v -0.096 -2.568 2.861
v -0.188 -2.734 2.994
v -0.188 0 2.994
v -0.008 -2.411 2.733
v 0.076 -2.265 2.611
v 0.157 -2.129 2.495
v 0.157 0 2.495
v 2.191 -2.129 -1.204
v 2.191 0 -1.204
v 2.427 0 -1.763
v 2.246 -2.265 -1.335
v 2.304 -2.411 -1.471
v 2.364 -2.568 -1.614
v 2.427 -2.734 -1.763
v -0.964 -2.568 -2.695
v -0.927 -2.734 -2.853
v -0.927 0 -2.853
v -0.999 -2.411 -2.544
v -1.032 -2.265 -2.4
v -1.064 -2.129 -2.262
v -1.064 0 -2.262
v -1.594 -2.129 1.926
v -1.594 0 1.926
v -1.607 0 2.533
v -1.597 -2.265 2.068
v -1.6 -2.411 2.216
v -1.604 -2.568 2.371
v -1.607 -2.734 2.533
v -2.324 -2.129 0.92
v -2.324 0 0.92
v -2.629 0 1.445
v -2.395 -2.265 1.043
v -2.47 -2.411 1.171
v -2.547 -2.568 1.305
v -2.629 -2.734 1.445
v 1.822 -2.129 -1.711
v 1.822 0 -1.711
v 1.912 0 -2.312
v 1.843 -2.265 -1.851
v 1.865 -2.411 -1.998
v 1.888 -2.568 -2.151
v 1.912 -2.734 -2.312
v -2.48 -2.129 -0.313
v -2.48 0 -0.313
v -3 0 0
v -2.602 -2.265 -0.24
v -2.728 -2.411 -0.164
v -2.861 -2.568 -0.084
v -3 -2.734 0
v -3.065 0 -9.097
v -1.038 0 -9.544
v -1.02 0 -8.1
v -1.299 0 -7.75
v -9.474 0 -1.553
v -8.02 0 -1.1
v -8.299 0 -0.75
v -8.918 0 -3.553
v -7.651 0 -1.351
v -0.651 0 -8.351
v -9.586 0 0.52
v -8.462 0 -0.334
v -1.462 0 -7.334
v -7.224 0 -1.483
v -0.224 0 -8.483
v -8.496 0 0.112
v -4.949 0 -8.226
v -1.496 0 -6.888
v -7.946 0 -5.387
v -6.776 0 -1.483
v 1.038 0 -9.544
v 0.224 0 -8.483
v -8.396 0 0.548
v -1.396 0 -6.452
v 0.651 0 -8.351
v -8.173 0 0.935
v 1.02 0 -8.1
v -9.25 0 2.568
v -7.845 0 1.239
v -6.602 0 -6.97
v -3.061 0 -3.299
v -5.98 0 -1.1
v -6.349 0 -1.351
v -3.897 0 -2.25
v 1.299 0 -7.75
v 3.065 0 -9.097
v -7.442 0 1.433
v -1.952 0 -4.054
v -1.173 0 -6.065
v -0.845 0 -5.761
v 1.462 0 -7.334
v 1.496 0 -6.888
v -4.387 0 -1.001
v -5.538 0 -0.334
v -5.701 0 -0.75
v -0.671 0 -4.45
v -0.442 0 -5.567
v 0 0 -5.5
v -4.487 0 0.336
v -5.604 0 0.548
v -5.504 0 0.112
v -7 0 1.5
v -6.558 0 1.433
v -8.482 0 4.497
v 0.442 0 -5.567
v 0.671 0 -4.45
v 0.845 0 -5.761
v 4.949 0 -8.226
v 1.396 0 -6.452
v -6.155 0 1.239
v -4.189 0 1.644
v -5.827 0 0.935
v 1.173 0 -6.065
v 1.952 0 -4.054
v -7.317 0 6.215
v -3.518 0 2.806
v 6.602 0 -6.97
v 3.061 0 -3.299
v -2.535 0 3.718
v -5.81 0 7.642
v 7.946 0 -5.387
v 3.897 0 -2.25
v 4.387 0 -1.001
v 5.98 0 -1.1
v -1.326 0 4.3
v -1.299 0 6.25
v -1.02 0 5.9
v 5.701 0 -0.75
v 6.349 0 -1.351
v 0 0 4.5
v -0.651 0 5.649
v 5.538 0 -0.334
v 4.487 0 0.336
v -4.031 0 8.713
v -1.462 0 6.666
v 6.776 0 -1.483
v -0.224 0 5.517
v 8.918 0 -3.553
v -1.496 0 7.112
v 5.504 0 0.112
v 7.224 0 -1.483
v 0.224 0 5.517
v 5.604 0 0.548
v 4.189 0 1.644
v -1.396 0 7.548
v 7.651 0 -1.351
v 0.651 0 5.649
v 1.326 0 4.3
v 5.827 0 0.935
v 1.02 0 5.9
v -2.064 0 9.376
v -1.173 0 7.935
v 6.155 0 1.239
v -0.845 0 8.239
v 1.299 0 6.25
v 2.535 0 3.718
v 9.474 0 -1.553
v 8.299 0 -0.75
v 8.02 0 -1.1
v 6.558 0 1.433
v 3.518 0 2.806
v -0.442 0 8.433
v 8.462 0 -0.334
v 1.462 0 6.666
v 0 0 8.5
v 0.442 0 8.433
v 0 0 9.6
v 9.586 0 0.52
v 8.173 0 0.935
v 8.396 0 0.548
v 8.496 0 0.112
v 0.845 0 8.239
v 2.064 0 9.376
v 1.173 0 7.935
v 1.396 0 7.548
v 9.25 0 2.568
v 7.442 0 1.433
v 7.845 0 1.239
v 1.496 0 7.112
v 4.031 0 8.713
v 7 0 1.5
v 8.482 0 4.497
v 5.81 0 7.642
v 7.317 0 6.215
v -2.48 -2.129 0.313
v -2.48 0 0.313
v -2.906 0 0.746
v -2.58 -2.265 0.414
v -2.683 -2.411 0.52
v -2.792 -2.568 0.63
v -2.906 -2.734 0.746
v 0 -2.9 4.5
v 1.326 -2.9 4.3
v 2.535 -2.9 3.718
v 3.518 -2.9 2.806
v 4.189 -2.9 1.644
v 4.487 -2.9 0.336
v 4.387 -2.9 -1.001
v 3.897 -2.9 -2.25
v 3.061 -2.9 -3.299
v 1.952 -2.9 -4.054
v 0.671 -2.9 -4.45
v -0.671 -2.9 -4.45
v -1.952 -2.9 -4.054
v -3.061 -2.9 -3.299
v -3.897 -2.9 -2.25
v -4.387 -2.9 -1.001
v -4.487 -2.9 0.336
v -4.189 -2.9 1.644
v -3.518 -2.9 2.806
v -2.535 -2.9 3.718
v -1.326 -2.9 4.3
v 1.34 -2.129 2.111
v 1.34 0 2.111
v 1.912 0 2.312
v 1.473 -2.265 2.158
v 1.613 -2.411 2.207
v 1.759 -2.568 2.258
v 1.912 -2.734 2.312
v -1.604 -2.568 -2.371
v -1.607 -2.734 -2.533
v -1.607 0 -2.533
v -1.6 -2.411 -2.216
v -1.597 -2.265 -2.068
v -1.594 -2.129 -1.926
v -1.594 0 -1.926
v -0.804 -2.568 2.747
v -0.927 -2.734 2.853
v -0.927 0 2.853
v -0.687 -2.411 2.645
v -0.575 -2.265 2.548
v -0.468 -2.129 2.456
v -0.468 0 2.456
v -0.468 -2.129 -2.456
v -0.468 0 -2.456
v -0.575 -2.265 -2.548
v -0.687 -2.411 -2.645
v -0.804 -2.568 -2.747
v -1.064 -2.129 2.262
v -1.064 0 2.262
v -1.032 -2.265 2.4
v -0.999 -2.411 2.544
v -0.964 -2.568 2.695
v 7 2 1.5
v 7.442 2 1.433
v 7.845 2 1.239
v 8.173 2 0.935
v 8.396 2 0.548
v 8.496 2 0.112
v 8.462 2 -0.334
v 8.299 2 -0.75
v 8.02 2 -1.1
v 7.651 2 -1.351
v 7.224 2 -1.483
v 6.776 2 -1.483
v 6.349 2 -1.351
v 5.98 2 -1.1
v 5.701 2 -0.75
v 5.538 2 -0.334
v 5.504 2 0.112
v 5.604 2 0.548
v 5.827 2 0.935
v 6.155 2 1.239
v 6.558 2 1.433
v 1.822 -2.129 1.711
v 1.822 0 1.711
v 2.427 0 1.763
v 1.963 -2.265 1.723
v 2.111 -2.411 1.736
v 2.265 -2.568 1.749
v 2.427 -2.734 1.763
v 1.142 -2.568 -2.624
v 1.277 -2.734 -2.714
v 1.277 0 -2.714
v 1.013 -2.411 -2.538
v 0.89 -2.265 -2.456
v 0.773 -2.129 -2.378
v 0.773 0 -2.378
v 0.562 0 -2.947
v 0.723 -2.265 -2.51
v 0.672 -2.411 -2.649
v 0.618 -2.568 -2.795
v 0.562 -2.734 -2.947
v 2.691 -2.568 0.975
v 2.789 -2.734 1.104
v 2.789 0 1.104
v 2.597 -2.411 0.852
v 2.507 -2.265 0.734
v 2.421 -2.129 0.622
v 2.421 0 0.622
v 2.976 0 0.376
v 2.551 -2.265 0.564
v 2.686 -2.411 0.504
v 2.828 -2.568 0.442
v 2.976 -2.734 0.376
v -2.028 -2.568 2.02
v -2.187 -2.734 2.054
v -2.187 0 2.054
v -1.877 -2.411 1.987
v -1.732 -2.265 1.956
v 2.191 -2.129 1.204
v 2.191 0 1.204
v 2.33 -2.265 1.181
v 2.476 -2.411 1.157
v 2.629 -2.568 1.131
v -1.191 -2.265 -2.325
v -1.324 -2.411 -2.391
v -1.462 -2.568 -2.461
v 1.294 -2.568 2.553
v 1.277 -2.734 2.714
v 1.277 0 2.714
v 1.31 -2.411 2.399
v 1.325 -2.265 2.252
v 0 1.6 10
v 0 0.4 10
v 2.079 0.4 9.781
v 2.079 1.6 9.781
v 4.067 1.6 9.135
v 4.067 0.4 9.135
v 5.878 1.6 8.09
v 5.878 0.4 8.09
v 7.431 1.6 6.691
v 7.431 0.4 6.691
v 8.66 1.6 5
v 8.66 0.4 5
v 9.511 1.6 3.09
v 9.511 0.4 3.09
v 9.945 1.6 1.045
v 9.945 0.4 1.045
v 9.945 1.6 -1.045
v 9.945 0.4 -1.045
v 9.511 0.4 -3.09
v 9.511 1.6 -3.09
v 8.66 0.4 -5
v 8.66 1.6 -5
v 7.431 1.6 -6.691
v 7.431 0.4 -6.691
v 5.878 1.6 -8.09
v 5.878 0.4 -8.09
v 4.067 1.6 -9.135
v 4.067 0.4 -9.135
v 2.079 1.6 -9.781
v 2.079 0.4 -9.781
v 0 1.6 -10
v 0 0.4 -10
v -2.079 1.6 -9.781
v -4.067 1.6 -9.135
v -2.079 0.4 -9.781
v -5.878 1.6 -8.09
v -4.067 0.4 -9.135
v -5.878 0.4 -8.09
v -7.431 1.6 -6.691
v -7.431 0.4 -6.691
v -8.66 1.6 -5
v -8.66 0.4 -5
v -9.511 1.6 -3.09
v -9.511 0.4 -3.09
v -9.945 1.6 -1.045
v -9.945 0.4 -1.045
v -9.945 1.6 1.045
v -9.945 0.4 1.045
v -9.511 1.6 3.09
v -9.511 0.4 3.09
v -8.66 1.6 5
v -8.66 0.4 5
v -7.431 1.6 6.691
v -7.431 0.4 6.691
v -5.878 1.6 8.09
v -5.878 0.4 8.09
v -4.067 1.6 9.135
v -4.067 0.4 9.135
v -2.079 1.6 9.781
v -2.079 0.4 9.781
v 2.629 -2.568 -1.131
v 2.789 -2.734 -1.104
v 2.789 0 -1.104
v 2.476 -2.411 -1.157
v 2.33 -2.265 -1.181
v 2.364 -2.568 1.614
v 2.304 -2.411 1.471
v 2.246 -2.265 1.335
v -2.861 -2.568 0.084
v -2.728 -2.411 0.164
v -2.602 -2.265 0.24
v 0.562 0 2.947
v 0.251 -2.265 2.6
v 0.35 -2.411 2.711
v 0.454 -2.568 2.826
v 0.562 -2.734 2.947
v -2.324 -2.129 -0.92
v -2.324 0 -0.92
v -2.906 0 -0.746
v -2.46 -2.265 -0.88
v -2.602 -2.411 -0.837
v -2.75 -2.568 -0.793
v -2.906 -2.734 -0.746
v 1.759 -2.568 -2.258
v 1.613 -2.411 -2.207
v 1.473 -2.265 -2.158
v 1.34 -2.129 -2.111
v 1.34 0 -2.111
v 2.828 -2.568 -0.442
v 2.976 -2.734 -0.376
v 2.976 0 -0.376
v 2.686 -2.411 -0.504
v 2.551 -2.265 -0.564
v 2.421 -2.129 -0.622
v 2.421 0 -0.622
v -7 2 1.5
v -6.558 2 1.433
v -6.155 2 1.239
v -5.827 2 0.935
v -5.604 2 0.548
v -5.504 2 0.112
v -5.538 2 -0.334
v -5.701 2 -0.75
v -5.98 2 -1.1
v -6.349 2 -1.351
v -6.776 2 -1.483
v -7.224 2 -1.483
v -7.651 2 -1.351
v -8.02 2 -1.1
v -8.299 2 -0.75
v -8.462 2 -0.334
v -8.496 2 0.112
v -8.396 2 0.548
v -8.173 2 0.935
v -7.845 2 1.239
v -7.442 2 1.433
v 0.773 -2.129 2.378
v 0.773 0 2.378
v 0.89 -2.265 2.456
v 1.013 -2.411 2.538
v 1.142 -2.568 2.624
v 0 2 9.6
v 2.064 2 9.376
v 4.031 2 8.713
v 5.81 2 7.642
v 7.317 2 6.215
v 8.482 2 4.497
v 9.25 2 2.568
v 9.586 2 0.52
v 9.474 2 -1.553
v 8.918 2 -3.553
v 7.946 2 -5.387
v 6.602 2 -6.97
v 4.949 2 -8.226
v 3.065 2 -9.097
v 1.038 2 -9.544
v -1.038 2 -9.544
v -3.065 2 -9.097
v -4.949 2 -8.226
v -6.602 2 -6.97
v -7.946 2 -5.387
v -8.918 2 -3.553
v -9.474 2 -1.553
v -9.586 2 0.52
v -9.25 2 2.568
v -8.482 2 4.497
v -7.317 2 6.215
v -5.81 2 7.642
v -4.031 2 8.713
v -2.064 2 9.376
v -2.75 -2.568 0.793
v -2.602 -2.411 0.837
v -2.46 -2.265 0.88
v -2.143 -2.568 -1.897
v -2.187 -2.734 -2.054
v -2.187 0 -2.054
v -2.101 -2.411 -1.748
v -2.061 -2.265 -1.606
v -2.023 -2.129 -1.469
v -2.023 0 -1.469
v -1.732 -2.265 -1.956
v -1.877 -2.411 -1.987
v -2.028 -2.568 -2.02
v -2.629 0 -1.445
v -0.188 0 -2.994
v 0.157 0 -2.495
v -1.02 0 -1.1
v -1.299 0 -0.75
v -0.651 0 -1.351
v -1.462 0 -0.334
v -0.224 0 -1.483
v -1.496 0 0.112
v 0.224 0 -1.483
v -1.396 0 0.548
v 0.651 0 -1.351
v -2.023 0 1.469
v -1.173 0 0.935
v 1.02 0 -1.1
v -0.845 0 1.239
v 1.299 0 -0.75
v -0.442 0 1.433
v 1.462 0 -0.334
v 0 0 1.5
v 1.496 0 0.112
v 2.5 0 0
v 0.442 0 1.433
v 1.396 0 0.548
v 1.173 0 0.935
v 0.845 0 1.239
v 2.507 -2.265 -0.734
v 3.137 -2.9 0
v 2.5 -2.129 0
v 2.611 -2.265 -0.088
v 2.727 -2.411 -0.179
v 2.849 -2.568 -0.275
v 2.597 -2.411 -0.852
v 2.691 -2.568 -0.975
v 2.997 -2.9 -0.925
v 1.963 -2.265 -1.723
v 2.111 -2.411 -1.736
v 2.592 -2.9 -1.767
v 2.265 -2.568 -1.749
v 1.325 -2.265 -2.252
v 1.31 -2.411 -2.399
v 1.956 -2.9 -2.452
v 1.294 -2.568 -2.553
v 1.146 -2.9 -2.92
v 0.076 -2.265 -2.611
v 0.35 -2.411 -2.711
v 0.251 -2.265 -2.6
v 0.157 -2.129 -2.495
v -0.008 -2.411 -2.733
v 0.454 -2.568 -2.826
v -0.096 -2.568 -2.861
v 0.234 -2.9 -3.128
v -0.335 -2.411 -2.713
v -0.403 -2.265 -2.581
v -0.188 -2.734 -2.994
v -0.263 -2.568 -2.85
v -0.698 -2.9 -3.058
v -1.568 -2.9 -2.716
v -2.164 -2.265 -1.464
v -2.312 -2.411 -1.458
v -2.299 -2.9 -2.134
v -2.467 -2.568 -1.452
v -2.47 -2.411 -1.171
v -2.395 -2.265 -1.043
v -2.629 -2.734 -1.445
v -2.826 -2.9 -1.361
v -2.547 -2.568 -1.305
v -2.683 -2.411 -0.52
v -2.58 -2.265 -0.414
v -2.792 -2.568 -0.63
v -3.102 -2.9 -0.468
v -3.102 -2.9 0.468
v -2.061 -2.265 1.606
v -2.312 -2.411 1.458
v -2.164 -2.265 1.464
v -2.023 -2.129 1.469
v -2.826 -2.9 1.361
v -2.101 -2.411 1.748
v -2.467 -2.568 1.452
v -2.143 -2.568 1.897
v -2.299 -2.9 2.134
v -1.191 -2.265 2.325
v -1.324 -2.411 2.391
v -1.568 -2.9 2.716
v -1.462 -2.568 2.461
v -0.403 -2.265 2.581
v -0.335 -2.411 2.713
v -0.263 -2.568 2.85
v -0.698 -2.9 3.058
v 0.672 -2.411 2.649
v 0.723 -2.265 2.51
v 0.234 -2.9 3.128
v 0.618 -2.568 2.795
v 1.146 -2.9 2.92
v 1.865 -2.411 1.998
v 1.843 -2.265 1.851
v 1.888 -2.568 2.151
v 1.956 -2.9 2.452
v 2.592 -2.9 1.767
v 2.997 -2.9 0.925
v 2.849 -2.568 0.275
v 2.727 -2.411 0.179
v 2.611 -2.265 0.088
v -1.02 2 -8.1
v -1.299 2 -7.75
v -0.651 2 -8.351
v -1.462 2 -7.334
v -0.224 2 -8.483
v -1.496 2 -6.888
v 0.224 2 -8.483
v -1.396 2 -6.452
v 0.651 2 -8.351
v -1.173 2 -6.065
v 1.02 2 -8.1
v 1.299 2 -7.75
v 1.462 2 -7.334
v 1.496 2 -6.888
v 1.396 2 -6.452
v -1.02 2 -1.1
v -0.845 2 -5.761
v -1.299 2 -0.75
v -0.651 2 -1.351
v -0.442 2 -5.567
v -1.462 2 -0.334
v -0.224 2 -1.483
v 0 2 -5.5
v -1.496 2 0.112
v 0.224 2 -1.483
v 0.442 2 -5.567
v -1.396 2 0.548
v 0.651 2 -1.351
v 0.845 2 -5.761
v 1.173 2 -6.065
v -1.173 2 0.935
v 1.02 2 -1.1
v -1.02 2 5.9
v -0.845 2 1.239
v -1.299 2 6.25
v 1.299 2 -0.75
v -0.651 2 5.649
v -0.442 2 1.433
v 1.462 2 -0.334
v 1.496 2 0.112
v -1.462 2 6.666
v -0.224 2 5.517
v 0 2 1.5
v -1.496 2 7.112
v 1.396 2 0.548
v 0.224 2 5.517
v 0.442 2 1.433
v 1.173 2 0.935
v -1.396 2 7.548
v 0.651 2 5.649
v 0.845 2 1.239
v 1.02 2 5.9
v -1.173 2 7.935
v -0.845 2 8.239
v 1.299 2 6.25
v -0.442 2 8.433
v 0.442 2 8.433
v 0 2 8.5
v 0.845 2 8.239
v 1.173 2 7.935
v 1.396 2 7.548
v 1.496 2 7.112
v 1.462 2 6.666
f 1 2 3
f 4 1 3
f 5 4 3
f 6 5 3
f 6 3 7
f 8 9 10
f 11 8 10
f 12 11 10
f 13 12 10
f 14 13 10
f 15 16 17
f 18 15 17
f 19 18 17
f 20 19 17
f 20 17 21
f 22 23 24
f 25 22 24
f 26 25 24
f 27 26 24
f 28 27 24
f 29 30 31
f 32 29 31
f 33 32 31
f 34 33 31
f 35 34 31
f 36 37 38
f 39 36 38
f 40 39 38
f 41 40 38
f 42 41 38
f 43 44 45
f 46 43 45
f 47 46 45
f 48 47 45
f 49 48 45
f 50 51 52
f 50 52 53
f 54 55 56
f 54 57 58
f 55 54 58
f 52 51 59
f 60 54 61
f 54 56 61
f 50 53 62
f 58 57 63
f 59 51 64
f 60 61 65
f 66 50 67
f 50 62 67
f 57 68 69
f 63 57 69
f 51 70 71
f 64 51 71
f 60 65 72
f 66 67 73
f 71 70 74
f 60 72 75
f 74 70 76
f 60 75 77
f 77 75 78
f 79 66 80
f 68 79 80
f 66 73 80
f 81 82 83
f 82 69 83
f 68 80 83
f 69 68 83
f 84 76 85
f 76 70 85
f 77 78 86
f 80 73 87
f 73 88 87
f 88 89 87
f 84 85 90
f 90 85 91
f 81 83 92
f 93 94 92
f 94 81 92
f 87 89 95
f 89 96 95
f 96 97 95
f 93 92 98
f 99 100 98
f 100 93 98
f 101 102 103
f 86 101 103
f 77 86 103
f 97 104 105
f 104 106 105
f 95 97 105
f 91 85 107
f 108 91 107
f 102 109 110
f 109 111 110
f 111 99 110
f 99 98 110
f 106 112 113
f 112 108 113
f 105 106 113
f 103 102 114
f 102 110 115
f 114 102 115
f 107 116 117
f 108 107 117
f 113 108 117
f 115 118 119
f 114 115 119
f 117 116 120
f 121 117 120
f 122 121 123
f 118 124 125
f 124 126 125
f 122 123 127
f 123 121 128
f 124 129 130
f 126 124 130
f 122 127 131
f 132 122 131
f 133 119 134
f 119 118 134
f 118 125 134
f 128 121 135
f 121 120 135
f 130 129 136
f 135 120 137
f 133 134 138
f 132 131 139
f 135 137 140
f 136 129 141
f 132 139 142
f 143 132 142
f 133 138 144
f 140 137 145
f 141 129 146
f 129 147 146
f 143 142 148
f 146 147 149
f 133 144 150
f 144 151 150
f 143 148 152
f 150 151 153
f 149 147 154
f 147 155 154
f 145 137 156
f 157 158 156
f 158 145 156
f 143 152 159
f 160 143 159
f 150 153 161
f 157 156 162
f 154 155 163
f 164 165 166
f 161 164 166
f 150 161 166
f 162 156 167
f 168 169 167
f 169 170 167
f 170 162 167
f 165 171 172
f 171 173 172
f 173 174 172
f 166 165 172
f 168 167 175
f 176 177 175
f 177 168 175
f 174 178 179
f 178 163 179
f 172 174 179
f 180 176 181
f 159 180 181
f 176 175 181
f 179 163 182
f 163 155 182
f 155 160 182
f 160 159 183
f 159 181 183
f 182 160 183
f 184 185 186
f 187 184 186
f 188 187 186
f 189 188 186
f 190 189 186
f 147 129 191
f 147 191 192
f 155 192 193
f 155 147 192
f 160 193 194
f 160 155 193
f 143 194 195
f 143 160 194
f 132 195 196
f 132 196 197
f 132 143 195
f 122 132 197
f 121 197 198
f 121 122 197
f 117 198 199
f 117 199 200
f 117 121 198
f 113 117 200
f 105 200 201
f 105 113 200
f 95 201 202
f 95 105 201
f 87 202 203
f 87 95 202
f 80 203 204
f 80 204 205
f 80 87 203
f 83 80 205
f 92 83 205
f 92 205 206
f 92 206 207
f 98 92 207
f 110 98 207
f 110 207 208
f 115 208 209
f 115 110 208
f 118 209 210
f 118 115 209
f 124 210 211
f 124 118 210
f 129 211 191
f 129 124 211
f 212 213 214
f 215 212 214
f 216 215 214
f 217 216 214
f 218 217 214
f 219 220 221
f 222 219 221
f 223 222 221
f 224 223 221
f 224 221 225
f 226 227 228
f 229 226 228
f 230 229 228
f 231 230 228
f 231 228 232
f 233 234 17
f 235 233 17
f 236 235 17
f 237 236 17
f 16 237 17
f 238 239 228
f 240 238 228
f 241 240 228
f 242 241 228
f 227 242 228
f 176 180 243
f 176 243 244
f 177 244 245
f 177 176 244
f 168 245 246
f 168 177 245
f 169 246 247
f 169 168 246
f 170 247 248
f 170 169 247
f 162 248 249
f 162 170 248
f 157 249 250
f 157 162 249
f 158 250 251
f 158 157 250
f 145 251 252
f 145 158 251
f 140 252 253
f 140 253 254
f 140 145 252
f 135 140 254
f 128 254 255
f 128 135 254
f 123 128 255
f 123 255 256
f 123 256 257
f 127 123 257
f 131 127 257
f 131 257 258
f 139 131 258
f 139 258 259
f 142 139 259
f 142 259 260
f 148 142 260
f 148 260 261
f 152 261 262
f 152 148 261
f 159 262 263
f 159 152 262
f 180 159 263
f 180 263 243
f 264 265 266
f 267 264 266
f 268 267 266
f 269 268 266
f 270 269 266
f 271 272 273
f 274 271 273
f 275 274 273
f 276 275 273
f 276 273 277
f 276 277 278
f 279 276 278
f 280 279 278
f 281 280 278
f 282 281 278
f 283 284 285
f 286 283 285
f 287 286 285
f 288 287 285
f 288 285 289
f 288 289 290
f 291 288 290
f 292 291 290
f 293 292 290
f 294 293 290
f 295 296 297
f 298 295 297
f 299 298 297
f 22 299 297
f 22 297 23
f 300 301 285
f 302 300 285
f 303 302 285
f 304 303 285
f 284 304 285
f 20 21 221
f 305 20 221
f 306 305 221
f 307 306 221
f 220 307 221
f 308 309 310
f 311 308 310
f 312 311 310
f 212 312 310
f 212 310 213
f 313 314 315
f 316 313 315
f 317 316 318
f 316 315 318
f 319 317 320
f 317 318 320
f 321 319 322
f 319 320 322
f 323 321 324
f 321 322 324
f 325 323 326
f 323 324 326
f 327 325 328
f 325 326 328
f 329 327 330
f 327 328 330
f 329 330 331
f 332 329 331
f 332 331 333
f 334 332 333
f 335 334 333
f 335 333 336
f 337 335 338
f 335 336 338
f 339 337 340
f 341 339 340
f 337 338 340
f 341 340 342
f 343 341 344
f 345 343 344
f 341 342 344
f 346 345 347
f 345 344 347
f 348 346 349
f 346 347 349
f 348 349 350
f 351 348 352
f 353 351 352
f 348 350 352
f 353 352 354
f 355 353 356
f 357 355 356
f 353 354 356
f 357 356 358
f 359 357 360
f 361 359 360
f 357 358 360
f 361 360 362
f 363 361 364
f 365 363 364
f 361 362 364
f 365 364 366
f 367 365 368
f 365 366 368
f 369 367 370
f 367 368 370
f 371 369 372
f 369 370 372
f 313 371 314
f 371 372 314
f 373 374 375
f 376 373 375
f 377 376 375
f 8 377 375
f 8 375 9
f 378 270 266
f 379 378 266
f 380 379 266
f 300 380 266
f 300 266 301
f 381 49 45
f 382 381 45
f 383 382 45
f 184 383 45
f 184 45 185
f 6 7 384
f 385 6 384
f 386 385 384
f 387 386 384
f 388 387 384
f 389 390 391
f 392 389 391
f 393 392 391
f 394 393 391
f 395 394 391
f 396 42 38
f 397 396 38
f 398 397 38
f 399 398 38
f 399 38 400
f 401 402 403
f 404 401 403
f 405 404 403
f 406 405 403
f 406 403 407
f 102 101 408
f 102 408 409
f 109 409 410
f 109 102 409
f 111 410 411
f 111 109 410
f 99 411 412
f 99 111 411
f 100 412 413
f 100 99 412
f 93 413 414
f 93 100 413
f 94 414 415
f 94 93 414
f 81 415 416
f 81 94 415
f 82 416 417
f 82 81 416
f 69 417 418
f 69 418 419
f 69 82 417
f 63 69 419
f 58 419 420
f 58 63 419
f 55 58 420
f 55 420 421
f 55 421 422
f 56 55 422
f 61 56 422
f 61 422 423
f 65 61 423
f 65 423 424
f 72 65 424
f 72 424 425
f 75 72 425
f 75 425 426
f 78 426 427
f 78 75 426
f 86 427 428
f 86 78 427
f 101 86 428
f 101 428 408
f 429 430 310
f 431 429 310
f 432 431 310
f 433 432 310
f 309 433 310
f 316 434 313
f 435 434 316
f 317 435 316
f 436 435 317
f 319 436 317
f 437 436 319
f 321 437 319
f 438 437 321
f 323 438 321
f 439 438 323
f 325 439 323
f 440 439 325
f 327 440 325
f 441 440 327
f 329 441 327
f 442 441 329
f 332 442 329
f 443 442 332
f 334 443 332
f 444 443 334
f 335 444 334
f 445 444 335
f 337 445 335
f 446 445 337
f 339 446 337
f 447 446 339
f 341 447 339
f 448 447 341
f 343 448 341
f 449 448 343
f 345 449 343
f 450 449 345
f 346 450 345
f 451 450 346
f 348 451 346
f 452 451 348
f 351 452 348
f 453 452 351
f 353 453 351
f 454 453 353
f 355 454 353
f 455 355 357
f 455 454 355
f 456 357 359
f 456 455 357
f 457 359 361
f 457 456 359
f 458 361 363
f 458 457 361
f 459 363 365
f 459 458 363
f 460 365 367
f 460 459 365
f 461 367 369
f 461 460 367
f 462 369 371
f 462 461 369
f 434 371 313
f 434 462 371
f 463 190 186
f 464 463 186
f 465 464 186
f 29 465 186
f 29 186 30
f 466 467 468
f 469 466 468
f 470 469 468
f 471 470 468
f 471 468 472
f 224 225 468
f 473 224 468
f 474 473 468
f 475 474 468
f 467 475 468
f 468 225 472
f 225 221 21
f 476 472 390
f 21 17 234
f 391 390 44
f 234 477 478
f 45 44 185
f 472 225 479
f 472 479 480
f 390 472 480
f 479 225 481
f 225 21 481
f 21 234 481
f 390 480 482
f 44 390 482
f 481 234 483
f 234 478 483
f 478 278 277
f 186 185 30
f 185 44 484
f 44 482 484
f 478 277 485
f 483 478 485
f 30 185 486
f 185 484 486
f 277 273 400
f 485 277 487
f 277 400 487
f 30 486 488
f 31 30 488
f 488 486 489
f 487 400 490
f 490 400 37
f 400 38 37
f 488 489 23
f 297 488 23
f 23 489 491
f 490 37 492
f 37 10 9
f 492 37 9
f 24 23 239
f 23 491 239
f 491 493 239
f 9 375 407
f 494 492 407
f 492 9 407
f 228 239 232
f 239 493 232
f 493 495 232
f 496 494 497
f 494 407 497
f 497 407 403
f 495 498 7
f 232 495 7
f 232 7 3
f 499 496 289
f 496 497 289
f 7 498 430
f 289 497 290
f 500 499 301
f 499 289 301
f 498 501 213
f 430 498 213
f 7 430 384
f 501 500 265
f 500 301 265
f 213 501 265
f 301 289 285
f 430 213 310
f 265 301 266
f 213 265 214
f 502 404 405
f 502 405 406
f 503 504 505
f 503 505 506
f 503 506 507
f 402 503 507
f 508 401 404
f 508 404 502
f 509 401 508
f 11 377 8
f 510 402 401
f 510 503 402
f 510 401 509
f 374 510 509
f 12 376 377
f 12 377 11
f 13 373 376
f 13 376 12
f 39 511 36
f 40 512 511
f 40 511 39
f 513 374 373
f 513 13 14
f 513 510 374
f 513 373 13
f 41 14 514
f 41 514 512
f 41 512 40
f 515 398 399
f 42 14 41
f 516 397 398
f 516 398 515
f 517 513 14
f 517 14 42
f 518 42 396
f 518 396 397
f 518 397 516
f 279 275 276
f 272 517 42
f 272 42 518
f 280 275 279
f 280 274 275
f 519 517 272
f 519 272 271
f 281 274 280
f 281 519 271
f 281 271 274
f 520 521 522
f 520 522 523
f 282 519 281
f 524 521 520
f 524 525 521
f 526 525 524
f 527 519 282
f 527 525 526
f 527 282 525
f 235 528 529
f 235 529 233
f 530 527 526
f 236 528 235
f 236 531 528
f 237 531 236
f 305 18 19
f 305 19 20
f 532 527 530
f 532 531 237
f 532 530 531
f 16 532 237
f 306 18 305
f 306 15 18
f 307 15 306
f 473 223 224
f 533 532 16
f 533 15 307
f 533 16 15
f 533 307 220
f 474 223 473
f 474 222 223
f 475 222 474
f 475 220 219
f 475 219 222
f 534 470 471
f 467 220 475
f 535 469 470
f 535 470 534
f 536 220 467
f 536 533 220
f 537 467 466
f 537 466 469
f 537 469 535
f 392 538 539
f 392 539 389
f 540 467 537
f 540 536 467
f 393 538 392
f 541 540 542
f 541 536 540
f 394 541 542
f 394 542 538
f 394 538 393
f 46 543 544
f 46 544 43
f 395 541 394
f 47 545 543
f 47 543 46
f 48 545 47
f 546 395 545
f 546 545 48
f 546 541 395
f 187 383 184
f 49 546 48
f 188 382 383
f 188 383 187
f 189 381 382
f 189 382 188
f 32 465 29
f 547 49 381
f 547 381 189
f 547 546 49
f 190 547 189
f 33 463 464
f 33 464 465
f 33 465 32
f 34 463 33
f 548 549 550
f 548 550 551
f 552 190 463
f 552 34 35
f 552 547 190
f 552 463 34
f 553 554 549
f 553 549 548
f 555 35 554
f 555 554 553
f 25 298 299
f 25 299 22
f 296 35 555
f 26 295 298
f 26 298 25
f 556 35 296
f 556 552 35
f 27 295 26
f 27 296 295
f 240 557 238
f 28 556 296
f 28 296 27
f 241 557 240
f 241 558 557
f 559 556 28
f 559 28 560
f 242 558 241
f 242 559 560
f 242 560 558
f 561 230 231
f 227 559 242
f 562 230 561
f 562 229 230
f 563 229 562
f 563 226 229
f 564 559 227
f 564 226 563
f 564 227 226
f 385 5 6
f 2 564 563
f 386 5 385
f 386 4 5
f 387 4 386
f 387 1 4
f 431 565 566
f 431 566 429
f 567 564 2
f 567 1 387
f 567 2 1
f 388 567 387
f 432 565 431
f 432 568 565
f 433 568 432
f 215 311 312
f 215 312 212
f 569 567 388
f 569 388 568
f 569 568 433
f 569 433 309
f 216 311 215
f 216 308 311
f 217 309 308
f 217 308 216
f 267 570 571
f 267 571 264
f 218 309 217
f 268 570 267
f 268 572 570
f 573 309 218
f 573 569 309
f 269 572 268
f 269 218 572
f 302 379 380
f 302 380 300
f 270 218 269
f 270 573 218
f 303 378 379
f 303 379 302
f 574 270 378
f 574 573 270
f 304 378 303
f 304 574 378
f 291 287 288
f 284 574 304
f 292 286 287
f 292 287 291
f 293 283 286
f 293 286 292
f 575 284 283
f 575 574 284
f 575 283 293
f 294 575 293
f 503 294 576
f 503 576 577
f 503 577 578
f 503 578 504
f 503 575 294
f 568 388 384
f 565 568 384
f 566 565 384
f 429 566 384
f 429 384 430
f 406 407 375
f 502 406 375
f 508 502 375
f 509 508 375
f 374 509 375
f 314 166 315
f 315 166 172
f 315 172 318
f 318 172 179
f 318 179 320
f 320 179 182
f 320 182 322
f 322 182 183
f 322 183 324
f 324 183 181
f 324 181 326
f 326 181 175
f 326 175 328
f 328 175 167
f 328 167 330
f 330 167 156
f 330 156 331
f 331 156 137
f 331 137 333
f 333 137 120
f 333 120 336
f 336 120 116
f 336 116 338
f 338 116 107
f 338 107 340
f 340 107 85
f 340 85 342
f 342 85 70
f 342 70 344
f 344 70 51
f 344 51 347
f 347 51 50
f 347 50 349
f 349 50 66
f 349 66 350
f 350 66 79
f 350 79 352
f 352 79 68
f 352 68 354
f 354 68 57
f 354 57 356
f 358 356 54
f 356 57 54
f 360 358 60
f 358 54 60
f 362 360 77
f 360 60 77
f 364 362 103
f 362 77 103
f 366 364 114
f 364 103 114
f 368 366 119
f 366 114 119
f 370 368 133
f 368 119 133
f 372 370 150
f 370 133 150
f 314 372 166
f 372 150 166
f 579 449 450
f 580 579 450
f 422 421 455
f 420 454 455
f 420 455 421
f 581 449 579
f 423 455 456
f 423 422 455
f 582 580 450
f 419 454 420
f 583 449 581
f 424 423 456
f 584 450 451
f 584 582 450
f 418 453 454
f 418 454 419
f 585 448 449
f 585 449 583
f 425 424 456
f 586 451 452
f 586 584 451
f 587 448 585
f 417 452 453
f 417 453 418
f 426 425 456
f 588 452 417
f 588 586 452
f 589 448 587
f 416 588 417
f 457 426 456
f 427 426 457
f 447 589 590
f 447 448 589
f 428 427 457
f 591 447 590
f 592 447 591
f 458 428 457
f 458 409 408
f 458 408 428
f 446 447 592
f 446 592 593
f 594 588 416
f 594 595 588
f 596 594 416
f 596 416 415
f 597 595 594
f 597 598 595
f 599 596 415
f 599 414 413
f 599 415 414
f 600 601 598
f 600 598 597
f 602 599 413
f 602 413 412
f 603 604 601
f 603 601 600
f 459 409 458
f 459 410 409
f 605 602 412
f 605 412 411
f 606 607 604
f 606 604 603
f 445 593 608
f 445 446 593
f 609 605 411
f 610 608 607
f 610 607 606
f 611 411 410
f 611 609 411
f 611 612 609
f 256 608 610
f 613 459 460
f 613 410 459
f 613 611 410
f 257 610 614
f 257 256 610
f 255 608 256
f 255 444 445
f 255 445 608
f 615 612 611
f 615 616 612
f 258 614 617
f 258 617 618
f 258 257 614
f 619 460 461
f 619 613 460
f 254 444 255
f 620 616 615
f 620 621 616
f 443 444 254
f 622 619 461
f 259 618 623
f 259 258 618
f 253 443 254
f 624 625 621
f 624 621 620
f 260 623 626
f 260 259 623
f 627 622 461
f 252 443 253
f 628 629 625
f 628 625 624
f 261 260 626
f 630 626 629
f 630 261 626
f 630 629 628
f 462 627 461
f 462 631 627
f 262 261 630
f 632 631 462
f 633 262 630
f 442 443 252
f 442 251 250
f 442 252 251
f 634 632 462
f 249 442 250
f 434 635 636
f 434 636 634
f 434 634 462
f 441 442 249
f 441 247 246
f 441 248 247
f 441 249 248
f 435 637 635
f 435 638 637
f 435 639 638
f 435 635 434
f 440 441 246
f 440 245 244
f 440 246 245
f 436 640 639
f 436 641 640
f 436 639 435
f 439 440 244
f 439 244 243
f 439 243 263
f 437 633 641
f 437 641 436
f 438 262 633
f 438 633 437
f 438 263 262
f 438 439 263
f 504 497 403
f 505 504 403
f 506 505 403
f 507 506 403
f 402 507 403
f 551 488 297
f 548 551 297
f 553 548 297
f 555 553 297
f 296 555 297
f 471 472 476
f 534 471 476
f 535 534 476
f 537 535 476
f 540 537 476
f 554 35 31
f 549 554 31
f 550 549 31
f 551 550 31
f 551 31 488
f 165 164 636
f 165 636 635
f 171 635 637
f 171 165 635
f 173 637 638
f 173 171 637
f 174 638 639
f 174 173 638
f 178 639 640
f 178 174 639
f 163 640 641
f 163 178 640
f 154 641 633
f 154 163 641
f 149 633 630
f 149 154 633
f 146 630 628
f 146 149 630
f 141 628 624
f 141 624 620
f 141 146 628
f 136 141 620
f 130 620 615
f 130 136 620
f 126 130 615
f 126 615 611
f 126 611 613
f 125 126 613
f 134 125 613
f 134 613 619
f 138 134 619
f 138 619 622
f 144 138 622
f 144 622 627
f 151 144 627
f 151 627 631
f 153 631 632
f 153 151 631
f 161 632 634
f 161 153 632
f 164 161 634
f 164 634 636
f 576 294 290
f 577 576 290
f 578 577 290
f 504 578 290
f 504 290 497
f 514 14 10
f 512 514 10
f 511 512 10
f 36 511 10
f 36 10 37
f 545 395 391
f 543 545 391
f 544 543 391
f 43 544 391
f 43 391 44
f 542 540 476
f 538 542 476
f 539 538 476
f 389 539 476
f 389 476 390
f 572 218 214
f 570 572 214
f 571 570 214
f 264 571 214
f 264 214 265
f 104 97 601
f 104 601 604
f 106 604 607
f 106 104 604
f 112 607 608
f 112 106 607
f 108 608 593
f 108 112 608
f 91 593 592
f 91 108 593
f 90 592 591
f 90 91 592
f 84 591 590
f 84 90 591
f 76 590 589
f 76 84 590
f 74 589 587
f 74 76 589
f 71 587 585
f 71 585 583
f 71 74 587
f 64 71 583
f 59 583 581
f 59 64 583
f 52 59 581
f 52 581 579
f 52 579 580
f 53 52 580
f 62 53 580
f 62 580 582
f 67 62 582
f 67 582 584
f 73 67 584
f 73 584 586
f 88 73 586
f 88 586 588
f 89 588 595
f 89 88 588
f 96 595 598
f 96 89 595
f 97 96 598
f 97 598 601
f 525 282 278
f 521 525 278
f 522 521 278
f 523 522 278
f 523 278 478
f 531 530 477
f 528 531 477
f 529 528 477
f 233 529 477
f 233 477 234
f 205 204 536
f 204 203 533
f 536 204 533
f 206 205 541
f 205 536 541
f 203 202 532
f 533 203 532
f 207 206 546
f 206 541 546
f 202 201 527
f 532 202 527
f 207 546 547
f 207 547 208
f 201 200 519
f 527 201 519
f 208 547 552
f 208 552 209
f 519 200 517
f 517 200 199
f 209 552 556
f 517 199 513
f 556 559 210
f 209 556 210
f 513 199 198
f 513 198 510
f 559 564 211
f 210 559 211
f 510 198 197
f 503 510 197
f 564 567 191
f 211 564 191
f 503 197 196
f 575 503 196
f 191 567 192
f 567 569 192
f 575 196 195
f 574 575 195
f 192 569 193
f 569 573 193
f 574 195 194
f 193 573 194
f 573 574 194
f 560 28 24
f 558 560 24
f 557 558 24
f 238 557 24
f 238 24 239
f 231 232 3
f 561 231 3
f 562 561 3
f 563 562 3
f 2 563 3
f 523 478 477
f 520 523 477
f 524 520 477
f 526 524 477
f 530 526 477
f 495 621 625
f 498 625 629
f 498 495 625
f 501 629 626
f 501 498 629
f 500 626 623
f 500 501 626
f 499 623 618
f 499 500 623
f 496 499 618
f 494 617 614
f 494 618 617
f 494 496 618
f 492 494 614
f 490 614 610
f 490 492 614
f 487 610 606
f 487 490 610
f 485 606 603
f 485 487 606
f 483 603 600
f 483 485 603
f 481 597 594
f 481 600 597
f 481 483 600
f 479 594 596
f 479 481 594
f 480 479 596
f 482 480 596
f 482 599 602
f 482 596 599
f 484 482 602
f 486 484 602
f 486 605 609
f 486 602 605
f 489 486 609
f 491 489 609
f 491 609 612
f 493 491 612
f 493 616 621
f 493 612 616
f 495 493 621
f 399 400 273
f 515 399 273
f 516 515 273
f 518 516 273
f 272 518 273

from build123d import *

# Parameters (mm, degrees)
SKETCH_1_R          = 10
SKETCH_1_R_2        = 1.5
EXTRUDE_2_DEPTH     = 2
SKETCH_2_R          = 4.5
EXTRUDE_3_DEPTH     = 2.9
CHAMFER_1_SIZE      = 0.4
SKETCH_5_R          = 1.5
CUT_EXTRUDE_1_DEPTH = 10


with BuildPart() as part:
    # 草图1 → 凸台-拉伸2 (new body)
    with BuildSketch(Plane(origin=(0, 0, 0), x_dir=(1, 0, 0), z_dir=(0, 1, 0))):
        with Locations(Location((0, 0, 0), (0, 0, 270))):
            Circle(SKETCH_1_R)
        with Locations(Location((0, 7, 0), (0, 0, 270))):
            Circle(SKETCH_1_R_2, mode=Mode.SUBTRACT)
        with Locations(Location((7, 0, 0), (0, 0, 270))):
            Circle(SKETCH_1_R_2, mode=Mode.SUBTRACT)
        with Locations(Location((-7, 0, 0), (0, 0, 270))):
            Circle(SKETCH_1_R_2, mode=Mode.SUBTRACT)
        with Locations(Location((0, -7, 0), (0, 0, 270))):
            Circle(SKETCH_1_R_2, mode=Mode.SUBTRACT)
    extrude(amount=EXTRUDE_2_DEPTH)

    # 草图2 → 凸台-拉伸3 (add)
    with BuildSketch(Plane(origin=(0, 0, 0), x_dir=(1, 0, 0), z_dir=(0, 1, 0))):
        with Locations(Location((0, 0, 0), (0, 0, 270))):
            Circle(SKETCH_2_R)
        Polygon((2.5, 0), (2.976344104, 0.375999701), (2.421457903, 0.621724718), (2.789329458, 1.104373658), (2.1907667, 1.204384185), (2.427050983, 1.763355757), (1.822421569, 1.711367765), (1.912271969, 2.311539728), (1.339566987, 2.110819814), (1.277337875, 2.714481157), (0.772542486, 2.377641291), (0.562143944, 2.946861752), (0.156976299, 2.495066821), (-0.188371559, 2.994080185), (-0.468453286, 2.455718127), (-0.927050983, 2.853169549), (-1.064448229, 2.262067631), (-1.607480385, 2.532983777), (-1.593559974, 1.926283107), (-2.186905882, 2.053641318), (-2.022542486, 1.469463131), (-2.62892004, 1.445261022), (-2.324441215, 0.920311382), (-2.905749483, 0.746069661), (-2.480286753, 0.313333084), (-3, 0), (-2.480286753, -0.313333084), (-2.905749483, -0.746069661), (-2.324441215, -0.920311382), (-2.62892004, -1.445261022), (-2.022542486, -1.469463131), (-2.186905882, -2.053641318), (-1.593559974, -1.926283107), (-1.607480385, -2.532983777), (-1.064448229, -2.262067631), (-0.927050983, -2.853169549), (-0.468453286, -2.455718127), (-0.188371559, -2.994080185), (0.156976299, -2.495066821), (0.562143944, -2.946861752), (0.772542486, -2.377641291), (1.277337875, -2.714481157), (1.339566987, -2.110819814), (1.912271969, -2.311539728), (1.822421569, -1.711367765), (2.427050983, -1.763355757), (2.1907667, -1.204384185), (2.789329458, -1.104373658), (2.421457903, -0.621724718), (2.976344104, -0.375999701), align=None, mode=Mode.SUBTRACT)
    extrude(amount=-EXTRUDE_3_DEPTH)

    # 草图4 → 切除-旋转1 (revolve, cut)
    with BuildSketch(Plane.XY):
        Polygon((0, -2.9), (0, -2.128896783), (2.5, -2.128896783), (3.136710161, -2.9), align=None)
    revolve(axis=Axis((0, -2.9, 0), (0, 1, 0)), mode=Mode.SUBTRACT)

    # 倒角1
    chamfer_1_edges = [part.edges().sort_by_distance(p)[0] for p in [
        (0, 0, -10),
        (0, 2, -10),
    ]]
    chamfer(chamfer_1_edges, length=CHAMFER_1_SIZE)

    # 草图5 → 切除-拉伸1 (cut)
    with BuildSketch(Plane(origin=(0, 0, 0), x_dir=(1, 0, 0), z_dir=(0, 1, 0))):
        with Locations(Location((0, 0, 0), (0, 0, 270))):
            Circle(SKETCH_5_R)
    extrude(amount=CUT_EXTRUDE_1_DEPTH, mode=Mode.SUBTRACT)


solid = part.part
